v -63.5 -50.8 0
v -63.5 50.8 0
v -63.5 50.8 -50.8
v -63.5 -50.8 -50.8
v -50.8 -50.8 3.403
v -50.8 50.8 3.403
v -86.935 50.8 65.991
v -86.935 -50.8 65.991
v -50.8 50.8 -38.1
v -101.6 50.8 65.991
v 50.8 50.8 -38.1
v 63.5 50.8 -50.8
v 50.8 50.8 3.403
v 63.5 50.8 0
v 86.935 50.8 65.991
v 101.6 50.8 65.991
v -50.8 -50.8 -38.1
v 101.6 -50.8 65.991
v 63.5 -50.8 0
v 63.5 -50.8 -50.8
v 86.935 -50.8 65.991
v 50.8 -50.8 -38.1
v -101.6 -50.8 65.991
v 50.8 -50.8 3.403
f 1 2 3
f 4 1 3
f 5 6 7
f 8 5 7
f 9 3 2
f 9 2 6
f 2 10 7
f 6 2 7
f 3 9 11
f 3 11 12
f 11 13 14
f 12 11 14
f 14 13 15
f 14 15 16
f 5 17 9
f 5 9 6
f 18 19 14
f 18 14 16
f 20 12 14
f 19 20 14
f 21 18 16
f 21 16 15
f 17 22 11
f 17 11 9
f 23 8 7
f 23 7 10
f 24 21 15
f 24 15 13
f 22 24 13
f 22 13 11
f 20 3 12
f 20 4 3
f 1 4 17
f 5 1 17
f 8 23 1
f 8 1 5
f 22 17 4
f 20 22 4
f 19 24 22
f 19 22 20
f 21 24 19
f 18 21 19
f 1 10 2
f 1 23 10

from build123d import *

# Parameters (mm, degrees)
F1_DEPTH = 50.8


# Not quite as in the source:
# - the program builds the solid bodies; features that only make, move or delete a surface that nothing else refers to are left out


with BuildPart() as f1:
    # F0 (on Front) → F1 (new body, symmetric)
    with BuildSketch(Plane.XZ):
        Polygon((-63.5, -50.8), (0, -50.8), (63.5, -50.8), (63.5, 0), (101.6, 65.9911357684), (86.9353031626, 65.9911357684), (50.8, 3.4029547439), (50.8, -38.1), (0, -38.1), (-50.8, -38.1), (-50.8, 3.4029547439), (-86.9353031626, 65.9911357684), (-101.6, 65.9911357684), (-63.5, 0), align=None)
    extrude(amount=F1_DEPTH, both=True)


solid = f1.part
